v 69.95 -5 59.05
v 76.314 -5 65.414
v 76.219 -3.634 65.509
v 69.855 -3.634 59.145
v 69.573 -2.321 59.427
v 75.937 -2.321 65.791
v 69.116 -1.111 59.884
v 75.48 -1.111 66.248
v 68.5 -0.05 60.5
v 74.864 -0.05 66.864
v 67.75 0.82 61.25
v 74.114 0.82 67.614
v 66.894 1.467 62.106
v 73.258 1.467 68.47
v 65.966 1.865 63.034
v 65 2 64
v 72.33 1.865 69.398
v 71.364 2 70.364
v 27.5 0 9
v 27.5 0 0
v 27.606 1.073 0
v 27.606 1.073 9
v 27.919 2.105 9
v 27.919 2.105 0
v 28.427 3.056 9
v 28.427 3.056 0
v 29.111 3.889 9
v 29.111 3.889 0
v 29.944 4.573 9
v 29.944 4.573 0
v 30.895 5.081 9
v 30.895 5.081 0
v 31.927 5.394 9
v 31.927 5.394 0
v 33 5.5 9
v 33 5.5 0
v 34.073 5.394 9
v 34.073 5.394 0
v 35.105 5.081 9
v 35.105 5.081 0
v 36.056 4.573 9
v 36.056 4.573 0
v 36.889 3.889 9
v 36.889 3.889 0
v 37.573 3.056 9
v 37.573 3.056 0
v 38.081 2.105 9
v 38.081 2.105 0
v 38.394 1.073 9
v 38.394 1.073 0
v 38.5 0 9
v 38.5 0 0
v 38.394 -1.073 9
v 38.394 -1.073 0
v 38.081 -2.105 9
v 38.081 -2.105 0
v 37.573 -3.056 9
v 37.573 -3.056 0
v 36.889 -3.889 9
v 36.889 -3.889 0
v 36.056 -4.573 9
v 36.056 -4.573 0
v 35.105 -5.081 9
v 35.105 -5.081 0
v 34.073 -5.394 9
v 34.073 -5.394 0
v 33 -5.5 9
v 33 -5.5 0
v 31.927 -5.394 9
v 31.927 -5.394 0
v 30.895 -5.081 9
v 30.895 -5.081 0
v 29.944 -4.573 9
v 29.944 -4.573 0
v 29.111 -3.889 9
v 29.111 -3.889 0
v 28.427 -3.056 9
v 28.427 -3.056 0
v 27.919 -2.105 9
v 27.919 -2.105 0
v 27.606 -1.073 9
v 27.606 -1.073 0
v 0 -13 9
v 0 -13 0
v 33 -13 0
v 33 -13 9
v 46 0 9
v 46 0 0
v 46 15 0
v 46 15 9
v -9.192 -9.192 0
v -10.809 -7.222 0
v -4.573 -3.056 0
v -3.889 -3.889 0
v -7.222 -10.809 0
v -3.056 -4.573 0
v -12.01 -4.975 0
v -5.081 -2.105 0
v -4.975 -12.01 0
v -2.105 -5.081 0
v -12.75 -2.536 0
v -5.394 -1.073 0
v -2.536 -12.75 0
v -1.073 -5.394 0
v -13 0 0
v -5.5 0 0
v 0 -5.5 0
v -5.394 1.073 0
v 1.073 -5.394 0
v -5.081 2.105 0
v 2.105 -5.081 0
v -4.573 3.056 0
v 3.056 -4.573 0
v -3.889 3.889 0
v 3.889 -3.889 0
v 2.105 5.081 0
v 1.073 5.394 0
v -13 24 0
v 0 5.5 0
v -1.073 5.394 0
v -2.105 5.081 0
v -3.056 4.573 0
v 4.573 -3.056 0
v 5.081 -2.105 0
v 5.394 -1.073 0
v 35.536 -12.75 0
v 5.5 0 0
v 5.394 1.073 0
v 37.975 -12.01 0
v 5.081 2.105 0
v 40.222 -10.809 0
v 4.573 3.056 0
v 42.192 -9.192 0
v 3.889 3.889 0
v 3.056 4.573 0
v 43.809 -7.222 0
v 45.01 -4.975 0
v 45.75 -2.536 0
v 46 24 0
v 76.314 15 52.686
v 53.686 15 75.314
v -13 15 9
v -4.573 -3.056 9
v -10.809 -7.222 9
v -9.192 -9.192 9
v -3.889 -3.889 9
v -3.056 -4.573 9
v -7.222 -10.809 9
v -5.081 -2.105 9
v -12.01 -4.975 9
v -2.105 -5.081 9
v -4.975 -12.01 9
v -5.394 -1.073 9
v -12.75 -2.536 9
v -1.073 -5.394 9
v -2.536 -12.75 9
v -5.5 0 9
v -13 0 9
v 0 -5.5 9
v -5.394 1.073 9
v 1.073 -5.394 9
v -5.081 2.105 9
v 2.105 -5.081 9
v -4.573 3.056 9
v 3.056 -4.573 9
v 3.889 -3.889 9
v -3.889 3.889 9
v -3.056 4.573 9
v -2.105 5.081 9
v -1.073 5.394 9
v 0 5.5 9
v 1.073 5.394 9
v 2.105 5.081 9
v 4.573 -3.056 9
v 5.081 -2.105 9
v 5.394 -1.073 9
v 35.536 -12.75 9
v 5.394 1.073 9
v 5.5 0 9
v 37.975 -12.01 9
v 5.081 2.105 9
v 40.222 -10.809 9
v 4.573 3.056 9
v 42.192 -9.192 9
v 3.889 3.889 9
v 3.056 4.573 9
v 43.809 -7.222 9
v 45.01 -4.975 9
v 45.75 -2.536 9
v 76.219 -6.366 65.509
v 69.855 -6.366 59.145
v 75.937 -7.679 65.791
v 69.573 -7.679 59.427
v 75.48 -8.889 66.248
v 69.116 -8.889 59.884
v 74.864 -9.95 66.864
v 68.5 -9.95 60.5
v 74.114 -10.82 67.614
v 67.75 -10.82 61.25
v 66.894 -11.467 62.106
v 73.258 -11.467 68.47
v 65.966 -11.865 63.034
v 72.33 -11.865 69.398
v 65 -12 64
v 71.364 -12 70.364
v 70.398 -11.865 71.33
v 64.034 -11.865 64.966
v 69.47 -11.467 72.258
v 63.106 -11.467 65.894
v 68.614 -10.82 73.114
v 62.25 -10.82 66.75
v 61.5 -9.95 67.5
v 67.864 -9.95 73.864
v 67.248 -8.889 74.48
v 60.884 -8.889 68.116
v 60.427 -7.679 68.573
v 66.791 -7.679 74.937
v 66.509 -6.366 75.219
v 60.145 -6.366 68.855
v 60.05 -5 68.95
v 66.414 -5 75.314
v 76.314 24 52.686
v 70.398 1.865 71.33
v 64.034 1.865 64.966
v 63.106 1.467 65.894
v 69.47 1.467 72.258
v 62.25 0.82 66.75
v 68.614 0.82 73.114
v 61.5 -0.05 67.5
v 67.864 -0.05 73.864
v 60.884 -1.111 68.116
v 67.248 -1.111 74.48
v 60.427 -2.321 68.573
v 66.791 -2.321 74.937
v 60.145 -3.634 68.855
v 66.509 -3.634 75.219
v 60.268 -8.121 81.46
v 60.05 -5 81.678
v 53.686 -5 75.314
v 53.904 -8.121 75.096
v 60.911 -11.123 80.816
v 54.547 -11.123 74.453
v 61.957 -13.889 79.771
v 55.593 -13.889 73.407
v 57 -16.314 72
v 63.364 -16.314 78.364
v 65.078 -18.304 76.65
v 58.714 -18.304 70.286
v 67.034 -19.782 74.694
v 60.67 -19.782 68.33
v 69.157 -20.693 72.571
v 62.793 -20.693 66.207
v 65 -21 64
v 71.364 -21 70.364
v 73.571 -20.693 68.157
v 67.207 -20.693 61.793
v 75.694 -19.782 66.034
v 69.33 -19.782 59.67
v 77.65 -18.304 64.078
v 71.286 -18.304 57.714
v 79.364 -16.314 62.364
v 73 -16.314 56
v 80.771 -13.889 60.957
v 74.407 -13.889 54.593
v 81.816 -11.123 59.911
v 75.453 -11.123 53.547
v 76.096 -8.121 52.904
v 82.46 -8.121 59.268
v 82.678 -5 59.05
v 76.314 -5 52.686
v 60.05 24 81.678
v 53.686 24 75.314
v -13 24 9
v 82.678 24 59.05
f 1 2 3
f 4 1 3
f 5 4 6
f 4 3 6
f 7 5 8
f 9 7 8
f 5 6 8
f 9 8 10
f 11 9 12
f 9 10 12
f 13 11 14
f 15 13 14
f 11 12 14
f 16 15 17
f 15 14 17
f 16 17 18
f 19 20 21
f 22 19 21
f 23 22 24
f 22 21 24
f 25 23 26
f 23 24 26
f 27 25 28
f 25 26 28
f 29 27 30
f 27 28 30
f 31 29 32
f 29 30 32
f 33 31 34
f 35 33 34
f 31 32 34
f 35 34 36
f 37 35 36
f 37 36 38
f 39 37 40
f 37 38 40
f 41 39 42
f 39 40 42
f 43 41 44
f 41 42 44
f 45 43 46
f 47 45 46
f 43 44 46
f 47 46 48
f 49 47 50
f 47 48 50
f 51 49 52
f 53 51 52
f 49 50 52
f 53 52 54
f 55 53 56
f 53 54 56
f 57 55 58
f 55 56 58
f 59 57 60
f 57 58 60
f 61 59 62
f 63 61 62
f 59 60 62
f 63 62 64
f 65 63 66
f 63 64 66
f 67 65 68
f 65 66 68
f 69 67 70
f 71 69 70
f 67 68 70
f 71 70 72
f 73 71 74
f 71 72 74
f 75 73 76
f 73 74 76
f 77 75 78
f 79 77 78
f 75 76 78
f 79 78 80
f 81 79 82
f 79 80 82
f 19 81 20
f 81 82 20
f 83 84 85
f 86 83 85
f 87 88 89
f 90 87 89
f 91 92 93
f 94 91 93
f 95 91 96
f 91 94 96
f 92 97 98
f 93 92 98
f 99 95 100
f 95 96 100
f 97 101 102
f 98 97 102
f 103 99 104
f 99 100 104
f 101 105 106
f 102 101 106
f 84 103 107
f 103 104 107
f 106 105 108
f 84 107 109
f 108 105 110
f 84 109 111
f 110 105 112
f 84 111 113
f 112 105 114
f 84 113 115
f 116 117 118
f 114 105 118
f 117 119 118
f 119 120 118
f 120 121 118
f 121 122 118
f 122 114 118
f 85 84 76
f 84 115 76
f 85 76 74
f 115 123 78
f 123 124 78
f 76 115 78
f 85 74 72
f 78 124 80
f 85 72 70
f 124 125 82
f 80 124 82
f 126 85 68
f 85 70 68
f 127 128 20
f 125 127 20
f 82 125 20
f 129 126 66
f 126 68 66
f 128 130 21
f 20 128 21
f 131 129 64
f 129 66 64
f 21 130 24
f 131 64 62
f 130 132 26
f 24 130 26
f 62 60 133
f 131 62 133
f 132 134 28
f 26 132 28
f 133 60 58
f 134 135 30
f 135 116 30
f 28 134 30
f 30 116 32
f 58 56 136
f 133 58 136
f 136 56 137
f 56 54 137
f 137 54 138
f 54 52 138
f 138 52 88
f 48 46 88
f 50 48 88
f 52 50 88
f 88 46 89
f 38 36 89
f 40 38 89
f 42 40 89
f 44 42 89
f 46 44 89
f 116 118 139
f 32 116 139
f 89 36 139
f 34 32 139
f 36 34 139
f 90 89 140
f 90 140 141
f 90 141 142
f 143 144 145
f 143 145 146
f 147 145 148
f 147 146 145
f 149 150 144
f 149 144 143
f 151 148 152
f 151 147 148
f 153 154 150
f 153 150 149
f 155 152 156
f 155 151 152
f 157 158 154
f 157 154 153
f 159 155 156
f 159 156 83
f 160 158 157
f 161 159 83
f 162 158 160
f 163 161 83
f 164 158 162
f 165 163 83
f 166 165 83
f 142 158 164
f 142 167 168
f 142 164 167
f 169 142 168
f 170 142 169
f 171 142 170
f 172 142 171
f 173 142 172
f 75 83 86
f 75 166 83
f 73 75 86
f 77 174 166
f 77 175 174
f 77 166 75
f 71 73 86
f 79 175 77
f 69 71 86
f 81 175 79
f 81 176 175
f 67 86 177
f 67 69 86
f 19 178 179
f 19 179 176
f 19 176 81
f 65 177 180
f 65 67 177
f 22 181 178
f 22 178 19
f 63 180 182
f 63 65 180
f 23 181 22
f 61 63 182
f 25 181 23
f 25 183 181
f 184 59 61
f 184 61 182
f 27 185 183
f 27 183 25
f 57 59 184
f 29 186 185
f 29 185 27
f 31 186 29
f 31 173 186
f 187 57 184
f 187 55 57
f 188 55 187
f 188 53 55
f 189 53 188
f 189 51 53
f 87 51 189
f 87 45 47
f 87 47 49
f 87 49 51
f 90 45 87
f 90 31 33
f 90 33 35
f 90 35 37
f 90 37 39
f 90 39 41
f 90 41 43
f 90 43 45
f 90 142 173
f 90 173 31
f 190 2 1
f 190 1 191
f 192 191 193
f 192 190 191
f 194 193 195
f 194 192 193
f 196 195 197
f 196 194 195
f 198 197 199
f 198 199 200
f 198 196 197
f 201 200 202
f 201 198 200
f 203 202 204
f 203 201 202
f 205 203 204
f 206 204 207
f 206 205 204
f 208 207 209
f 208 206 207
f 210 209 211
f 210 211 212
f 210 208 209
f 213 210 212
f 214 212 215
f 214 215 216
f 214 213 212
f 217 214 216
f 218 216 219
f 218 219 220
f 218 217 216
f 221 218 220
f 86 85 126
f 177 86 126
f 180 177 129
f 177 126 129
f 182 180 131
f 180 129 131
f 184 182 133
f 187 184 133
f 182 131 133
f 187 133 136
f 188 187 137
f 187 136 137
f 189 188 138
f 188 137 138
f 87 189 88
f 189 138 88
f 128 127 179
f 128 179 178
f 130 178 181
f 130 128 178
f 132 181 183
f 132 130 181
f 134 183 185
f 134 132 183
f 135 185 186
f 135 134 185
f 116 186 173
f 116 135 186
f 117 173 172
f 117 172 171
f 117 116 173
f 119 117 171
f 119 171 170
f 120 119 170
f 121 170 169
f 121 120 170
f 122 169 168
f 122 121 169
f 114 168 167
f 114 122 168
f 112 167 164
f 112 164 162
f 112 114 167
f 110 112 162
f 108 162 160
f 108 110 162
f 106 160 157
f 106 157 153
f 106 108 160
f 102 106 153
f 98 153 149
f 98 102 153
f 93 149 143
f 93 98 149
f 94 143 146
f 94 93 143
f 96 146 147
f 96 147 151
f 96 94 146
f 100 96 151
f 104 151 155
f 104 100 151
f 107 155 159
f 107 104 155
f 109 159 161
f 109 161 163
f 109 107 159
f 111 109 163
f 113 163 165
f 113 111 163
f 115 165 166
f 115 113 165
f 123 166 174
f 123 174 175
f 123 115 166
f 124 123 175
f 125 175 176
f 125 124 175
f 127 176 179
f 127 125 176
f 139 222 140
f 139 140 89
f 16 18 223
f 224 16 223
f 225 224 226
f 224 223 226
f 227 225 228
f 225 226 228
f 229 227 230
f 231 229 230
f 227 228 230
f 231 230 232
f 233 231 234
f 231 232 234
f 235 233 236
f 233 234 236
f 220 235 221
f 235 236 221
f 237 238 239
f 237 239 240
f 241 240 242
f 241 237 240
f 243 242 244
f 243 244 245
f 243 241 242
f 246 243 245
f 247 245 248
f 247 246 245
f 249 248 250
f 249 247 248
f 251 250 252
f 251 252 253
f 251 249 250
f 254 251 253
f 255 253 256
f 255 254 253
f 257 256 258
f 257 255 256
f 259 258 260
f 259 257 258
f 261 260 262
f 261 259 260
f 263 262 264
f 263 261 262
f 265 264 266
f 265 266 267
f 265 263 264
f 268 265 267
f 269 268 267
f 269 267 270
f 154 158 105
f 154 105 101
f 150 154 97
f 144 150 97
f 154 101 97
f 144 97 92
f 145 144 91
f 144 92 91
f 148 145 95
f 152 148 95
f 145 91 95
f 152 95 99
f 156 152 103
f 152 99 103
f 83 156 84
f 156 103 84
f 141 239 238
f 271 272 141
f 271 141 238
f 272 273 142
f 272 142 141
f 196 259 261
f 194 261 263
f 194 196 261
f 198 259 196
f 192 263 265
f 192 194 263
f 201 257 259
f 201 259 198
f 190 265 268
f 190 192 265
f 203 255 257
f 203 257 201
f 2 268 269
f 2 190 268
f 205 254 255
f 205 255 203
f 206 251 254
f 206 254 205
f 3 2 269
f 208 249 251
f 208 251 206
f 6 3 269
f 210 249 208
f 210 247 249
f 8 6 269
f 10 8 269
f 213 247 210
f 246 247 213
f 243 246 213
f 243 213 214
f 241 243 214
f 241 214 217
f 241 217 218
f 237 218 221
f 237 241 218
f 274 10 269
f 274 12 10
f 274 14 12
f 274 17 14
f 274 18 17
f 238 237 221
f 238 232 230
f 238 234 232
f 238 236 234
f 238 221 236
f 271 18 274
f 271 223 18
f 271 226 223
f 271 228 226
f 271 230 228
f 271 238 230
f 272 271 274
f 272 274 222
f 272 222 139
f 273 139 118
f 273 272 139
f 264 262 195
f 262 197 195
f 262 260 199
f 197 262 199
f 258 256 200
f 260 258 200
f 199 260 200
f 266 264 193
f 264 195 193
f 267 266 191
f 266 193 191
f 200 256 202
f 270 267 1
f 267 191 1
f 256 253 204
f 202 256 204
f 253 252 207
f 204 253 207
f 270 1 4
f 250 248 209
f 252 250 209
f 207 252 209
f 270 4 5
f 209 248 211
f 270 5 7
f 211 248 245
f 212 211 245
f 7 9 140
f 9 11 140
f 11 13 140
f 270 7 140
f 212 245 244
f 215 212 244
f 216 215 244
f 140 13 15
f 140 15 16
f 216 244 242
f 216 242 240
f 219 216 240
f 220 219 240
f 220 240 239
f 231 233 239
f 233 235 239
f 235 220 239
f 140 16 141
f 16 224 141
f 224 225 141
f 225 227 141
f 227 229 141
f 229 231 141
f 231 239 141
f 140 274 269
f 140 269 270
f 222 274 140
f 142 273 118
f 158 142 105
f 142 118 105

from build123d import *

# Parameters (mm, degrees)
F0_R     = 5.5
F1_DEPTH = 9
F4_DEPTH = 9
F5_DEPTH = 29
F7_DEPTH = 9
F8_DEPTH = 9


with BuildPart() as f1:
    # F0 (on Top) → F1 (new body)
    with BuildSketch(Plane.XY):
        with BuildLine():
            Line((-13, 24), (-13, 0))
            ThreePointArc((-13, 0), (-9.1923881554, -9.1923881554), (0, -13))
            Line((0, -13), (33, -13))
            ThreePointArc((33, -13), (42.1923881554, -9.1923881554), (46, 0))
            Line((46, 0), (46, 24))
            Line((46, 24), (-13, 24))
        make_face()
        Circle(F0_R, mode=Mode.SUBTRACT)
        with BuildLine():
            ThreePointArc((38.5, 0), (33, -5.5), (27.5, 0))
            ThreePointArc((27.5, 0), (33, 5.5), (38.5, 0))
        make_face(mode=Mode.SUBTRACT)
    extrude(amount=F1_DEPTH)

    # F3 (on face) → F4 (join)
    with BuildSketch(Plane(origin=(0, 24, 0), x_dir=(-1, 0, 0), z_dir=(0, 1, 0))):
        Polygon((-65, 64), (-76.313708499, 52.686291501), (-46, 0), (-46, 9), (13, 9), (-53.686291501, 75.313708499), align=None)
    extrude(amount=-F4_DEPTH)

    # F2 (on face) → F5 (join)
    with BuildSketch(Plane(origin=(0, 24, 0), x_dir=(-1, 0, 0), z_dir=(0, 1, 0))):
        Polygon((-76.313708499, 52.686291501), (-65, 64), (-53.686291501, 75.313708499), (-60.0502525317, 81.6776695297), (-82.6776695297, 59.0502525317), align=None)
    extrude(amount=-F5_DEPTH)

    # F6 (on face) → F7 (cut)
    with BuildSketch(Plane(origin=(70.8639610307, 0, 70.8639610307), x_dir=(0, 1, 0), z_dir=(0.7071067812, 0, 0.7071067812))):
        with BuildLine():
            ThreePointArc((2, -0.7071067812), (-0.0502525317, 4.2426406871), (-5, 6.2928932188))
            Line((-5, 6.2928932188), (-5, -7.7071067812))
            ThreePointArc((-5, -7.7071067812), (-0.0502525317, -5.6568542495), (2, -0.7071067812))
        make_face()
    extrude(amount=-F7_DEPTH, mode=Mode.SUBTRACT)

    # F6 (on face) → F8 (join)
    with BuildSketch(Plane(origin=(70.8639610307, 0, 70.8639610307), x_dir=(0, 1, 0), z_dir=(0.7071067812, 0, 0.7071067812))):
        with BuildLine():
            Line((-5, 6.2928932188), (-5, 15.2928932188))
            ThreePointArc((-5, 15.2928932188), (-21, -0.7071067812), (-5, -16.7071067812))
            Line((-5, -16.7071067812), (-5, -7.7071067812))
            ThreePointArc((-5, -7.7071067812), (-12, -0.7071067812), (-5, 6.2928932188))
        make_face()
    extrude(amount=-F8_DEPTH)


solid = f1.part
